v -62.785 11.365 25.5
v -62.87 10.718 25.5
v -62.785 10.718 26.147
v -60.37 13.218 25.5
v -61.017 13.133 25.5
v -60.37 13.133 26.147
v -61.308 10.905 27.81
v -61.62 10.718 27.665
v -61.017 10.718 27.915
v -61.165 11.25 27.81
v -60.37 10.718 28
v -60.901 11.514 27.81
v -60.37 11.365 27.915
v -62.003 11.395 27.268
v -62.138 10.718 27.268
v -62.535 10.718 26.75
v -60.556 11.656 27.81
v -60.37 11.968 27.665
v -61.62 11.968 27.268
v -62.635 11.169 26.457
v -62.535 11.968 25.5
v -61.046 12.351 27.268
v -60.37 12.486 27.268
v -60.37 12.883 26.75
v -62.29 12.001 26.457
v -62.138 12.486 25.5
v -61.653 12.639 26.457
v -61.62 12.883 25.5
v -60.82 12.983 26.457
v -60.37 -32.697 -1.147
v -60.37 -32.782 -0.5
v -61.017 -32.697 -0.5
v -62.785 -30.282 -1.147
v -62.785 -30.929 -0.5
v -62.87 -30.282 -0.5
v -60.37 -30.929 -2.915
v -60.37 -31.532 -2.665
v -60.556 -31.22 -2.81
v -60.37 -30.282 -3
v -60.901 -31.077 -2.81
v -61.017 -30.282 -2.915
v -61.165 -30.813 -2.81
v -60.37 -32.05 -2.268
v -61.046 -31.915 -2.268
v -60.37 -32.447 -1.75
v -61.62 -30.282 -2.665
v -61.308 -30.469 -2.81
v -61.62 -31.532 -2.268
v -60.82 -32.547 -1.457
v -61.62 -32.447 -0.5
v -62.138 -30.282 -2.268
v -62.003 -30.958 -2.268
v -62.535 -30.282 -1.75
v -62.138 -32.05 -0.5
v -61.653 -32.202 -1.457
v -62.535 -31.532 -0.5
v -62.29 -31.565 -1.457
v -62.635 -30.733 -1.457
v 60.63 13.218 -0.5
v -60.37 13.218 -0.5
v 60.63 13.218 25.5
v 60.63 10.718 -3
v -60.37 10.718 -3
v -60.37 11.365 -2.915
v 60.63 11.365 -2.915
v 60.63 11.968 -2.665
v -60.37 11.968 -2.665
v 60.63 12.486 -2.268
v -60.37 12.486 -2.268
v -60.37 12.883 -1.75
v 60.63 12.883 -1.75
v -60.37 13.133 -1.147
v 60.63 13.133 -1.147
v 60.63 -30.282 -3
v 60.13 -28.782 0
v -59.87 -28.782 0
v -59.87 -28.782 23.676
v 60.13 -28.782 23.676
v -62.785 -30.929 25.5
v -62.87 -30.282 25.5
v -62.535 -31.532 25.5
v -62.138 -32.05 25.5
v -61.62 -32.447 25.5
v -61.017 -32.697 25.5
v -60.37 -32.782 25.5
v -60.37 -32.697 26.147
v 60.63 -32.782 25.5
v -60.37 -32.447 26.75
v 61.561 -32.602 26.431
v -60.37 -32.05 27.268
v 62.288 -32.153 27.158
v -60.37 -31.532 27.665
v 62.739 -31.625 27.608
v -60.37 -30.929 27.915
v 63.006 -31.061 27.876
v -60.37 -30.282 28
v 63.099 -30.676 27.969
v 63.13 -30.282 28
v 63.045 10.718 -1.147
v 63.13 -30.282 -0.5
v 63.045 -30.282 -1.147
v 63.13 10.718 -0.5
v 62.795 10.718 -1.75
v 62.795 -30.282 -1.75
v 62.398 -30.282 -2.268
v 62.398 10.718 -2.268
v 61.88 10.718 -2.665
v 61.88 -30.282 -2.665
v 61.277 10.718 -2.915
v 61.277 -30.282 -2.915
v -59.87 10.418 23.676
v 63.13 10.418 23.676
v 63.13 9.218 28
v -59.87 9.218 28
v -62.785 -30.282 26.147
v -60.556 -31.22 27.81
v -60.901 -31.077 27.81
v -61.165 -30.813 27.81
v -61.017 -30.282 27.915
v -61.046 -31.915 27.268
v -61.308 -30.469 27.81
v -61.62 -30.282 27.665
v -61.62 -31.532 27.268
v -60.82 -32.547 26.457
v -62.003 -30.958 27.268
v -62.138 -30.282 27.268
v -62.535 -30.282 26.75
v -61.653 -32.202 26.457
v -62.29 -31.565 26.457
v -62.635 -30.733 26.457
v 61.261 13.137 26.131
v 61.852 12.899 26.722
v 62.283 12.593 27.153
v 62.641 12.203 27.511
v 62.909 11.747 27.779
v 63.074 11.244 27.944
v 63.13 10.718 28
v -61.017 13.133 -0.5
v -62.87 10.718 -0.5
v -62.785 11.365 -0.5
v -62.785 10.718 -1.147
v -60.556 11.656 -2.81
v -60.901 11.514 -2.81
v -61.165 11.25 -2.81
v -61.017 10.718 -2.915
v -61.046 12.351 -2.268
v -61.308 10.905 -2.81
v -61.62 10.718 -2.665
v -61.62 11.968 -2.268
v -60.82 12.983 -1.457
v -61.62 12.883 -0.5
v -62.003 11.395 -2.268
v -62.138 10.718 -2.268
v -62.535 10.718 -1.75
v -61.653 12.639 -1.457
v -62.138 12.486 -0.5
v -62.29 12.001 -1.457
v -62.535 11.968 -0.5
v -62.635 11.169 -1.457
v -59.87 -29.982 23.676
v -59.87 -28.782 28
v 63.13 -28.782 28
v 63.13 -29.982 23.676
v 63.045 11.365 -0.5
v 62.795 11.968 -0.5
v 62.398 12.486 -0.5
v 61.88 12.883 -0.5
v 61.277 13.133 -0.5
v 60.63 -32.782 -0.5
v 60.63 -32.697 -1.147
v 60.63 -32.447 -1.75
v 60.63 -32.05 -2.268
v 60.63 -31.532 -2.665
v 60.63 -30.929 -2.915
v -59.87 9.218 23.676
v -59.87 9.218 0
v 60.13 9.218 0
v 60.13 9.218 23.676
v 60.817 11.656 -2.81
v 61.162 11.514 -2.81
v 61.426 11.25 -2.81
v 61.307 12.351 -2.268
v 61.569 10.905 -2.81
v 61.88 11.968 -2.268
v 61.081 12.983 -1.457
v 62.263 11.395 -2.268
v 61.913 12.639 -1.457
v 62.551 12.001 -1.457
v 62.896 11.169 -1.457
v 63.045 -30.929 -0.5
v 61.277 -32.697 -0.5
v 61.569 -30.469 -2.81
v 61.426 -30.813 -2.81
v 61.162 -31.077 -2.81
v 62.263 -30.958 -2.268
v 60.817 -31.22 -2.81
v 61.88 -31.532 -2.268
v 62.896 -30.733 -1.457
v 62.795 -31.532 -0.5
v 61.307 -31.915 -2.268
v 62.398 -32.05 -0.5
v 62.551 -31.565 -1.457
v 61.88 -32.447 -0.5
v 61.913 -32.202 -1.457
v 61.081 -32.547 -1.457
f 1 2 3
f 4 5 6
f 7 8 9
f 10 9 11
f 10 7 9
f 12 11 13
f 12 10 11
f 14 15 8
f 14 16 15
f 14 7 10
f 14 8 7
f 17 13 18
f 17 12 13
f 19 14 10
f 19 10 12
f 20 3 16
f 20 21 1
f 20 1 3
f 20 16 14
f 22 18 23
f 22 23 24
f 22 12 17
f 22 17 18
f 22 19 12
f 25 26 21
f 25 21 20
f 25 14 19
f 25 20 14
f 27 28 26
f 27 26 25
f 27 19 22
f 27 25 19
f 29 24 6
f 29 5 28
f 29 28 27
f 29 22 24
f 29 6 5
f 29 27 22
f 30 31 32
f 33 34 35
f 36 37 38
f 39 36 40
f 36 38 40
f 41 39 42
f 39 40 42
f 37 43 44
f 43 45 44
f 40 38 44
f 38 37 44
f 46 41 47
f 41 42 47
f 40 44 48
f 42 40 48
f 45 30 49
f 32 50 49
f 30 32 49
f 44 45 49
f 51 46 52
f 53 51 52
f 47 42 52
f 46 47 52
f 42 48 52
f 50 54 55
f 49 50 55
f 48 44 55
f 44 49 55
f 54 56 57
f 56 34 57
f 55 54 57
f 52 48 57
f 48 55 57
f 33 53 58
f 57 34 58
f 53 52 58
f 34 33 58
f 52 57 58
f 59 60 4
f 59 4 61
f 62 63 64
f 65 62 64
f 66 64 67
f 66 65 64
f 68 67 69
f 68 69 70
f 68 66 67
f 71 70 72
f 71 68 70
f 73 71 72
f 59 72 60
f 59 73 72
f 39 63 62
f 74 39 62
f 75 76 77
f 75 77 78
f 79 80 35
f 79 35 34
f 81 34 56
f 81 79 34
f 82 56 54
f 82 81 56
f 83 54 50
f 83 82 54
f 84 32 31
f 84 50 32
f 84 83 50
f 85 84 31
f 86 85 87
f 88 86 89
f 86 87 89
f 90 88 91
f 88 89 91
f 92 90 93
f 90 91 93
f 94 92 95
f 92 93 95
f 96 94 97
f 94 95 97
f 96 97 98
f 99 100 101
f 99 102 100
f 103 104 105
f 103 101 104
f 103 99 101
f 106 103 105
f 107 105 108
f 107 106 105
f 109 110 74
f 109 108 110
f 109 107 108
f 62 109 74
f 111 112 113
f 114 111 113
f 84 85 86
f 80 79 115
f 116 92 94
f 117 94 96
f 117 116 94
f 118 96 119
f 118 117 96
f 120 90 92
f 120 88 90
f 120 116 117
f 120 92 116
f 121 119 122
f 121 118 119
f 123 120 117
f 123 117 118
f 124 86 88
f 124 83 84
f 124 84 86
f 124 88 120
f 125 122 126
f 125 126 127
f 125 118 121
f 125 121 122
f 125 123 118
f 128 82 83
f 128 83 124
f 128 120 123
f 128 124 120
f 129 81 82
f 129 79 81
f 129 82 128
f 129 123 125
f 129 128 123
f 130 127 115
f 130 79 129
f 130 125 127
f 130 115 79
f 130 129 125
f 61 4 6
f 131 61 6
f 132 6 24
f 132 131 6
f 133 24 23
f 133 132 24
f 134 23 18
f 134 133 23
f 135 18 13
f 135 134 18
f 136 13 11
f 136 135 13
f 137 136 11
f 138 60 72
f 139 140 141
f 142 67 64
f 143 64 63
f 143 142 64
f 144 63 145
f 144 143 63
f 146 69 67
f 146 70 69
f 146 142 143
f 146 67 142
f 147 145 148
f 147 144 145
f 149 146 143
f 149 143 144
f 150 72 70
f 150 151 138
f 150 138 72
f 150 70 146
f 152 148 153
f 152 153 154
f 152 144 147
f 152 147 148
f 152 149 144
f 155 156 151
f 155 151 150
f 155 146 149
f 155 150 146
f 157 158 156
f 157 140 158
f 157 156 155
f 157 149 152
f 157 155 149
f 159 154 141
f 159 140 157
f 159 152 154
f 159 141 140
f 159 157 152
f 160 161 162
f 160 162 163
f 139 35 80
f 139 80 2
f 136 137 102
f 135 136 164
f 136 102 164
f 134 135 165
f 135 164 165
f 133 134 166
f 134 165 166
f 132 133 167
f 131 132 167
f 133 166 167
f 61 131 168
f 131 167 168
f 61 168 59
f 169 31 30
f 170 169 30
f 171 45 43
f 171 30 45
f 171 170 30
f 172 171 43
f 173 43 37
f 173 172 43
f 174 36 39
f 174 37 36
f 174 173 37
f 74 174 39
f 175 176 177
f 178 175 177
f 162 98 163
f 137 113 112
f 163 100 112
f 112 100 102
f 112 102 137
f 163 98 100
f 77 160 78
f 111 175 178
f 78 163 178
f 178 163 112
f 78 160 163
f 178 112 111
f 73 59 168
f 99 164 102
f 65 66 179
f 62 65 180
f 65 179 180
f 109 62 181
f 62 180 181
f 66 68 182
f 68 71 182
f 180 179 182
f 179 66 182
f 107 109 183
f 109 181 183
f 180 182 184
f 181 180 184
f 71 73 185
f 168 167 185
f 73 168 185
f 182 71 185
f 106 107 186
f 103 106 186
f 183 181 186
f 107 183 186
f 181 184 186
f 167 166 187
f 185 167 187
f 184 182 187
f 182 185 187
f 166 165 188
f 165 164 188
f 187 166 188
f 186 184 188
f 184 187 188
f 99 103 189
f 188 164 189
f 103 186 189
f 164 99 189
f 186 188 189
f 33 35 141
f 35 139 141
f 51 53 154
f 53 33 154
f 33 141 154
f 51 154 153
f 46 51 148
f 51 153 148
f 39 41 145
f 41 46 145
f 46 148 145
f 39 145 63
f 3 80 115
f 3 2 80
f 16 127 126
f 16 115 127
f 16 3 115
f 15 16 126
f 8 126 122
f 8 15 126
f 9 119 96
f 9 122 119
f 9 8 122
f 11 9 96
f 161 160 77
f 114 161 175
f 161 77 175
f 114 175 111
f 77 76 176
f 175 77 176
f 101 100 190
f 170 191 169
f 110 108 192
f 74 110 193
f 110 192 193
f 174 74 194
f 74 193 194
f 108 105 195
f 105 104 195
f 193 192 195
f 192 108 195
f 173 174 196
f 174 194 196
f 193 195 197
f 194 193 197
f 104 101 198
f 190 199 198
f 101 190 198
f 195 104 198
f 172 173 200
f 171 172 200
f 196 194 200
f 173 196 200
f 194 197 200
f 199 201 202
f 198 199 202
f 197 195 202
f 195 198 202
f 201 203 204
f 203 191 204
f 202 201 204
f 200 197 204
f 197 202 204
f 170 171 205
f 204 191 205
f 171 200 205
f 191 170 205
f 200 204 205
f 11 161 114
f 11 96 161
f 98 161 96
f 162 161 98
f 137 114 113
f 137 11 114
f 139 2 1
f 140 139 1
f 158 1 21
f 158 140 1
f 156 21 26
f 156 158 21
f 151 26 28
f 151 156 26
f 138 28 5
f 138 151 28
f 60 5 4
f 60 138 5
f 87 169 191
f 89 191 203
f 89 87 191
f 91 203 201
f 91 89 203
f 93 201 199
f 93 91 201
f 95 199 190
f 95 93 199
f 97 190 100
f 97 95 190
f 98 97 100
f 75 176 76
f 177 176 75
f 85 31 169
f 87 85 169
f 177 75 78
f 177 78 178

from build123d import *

# Parameters (mm, degrees)
F0_W     = 126
F0_H     = 46
F0_W_2   = 120
F0_H_2   = 38
F1_DEPTH = 3
F2_DEPTH = 28
F4_DEPTH = 123
F5_R     = 2.5


with BuildPart() as f1:
    # F0 (on Top) → F1 (new body)
    with BuildSketch(Plane.XY):
        with Locations((0.13021, -9.781944)):
            Rectangle(F0_W, F0_H)
        with Locations((0.13021, -9.781944)):
            Rectangle(F0_W_2, F0_H_2, mode=Mode.SUBTRACT)
        with Locations((0.13021, -9.781944)):
            Rectangle(F0_W_2, F0_H_2)
    extrude(amount=-F1_DEPTH)

    # F0 (on Top) → F2 (join)
    with BuildSketch(Plane.XY):
        with Locations((0.13021, -9.781944)):
            Rectangle(F0_W, F0_H)
        with Locations((0.13021, -9.781944)):
            Rectangle(F0_W_2, F0_H_2, mode=Mode.SUBTRACT)
    extrude(amount=F2_DEPTH)

    # F3 (on face) → F4 (cut)
    with BuildSketch(Plane.YZ.offset(63.13021)):
        Polygon((9.218056, 28), (-28.781944, 28), (-29.981944, 23.676099), (-28.781944, 23.676099), (9.218056, 23.676099), (10.418056, 23.676099), align=None)
    extrude(amount=-F4_DEPTH, mode=Mode.SUBTRACT)

    # F5
    f5_edges = [f1.edges().sort_by_distance(p)[0] for p in [
        (63.13021, -32.781944, 12.5),
        (63.13021, 13.218056, 12.5),
        (-62.86979, -32.781944, 12.5),
        (-62.86979, 13.218056, 12.5),
        (0.13021, 13.218056, -3),
        (63.13021, -9.781944, -3),
        (0.13021, -32.781944, -3),
        (-62.86979, -9.781944, -3),
        (0.13021, -32.781944, 28),
        (-62.86979, -9.781944, 28),
        (0.13021, 13.218056, 28),
    ]]
    fillet(f5_edges, radius=F5_R)


solid = f1.part
